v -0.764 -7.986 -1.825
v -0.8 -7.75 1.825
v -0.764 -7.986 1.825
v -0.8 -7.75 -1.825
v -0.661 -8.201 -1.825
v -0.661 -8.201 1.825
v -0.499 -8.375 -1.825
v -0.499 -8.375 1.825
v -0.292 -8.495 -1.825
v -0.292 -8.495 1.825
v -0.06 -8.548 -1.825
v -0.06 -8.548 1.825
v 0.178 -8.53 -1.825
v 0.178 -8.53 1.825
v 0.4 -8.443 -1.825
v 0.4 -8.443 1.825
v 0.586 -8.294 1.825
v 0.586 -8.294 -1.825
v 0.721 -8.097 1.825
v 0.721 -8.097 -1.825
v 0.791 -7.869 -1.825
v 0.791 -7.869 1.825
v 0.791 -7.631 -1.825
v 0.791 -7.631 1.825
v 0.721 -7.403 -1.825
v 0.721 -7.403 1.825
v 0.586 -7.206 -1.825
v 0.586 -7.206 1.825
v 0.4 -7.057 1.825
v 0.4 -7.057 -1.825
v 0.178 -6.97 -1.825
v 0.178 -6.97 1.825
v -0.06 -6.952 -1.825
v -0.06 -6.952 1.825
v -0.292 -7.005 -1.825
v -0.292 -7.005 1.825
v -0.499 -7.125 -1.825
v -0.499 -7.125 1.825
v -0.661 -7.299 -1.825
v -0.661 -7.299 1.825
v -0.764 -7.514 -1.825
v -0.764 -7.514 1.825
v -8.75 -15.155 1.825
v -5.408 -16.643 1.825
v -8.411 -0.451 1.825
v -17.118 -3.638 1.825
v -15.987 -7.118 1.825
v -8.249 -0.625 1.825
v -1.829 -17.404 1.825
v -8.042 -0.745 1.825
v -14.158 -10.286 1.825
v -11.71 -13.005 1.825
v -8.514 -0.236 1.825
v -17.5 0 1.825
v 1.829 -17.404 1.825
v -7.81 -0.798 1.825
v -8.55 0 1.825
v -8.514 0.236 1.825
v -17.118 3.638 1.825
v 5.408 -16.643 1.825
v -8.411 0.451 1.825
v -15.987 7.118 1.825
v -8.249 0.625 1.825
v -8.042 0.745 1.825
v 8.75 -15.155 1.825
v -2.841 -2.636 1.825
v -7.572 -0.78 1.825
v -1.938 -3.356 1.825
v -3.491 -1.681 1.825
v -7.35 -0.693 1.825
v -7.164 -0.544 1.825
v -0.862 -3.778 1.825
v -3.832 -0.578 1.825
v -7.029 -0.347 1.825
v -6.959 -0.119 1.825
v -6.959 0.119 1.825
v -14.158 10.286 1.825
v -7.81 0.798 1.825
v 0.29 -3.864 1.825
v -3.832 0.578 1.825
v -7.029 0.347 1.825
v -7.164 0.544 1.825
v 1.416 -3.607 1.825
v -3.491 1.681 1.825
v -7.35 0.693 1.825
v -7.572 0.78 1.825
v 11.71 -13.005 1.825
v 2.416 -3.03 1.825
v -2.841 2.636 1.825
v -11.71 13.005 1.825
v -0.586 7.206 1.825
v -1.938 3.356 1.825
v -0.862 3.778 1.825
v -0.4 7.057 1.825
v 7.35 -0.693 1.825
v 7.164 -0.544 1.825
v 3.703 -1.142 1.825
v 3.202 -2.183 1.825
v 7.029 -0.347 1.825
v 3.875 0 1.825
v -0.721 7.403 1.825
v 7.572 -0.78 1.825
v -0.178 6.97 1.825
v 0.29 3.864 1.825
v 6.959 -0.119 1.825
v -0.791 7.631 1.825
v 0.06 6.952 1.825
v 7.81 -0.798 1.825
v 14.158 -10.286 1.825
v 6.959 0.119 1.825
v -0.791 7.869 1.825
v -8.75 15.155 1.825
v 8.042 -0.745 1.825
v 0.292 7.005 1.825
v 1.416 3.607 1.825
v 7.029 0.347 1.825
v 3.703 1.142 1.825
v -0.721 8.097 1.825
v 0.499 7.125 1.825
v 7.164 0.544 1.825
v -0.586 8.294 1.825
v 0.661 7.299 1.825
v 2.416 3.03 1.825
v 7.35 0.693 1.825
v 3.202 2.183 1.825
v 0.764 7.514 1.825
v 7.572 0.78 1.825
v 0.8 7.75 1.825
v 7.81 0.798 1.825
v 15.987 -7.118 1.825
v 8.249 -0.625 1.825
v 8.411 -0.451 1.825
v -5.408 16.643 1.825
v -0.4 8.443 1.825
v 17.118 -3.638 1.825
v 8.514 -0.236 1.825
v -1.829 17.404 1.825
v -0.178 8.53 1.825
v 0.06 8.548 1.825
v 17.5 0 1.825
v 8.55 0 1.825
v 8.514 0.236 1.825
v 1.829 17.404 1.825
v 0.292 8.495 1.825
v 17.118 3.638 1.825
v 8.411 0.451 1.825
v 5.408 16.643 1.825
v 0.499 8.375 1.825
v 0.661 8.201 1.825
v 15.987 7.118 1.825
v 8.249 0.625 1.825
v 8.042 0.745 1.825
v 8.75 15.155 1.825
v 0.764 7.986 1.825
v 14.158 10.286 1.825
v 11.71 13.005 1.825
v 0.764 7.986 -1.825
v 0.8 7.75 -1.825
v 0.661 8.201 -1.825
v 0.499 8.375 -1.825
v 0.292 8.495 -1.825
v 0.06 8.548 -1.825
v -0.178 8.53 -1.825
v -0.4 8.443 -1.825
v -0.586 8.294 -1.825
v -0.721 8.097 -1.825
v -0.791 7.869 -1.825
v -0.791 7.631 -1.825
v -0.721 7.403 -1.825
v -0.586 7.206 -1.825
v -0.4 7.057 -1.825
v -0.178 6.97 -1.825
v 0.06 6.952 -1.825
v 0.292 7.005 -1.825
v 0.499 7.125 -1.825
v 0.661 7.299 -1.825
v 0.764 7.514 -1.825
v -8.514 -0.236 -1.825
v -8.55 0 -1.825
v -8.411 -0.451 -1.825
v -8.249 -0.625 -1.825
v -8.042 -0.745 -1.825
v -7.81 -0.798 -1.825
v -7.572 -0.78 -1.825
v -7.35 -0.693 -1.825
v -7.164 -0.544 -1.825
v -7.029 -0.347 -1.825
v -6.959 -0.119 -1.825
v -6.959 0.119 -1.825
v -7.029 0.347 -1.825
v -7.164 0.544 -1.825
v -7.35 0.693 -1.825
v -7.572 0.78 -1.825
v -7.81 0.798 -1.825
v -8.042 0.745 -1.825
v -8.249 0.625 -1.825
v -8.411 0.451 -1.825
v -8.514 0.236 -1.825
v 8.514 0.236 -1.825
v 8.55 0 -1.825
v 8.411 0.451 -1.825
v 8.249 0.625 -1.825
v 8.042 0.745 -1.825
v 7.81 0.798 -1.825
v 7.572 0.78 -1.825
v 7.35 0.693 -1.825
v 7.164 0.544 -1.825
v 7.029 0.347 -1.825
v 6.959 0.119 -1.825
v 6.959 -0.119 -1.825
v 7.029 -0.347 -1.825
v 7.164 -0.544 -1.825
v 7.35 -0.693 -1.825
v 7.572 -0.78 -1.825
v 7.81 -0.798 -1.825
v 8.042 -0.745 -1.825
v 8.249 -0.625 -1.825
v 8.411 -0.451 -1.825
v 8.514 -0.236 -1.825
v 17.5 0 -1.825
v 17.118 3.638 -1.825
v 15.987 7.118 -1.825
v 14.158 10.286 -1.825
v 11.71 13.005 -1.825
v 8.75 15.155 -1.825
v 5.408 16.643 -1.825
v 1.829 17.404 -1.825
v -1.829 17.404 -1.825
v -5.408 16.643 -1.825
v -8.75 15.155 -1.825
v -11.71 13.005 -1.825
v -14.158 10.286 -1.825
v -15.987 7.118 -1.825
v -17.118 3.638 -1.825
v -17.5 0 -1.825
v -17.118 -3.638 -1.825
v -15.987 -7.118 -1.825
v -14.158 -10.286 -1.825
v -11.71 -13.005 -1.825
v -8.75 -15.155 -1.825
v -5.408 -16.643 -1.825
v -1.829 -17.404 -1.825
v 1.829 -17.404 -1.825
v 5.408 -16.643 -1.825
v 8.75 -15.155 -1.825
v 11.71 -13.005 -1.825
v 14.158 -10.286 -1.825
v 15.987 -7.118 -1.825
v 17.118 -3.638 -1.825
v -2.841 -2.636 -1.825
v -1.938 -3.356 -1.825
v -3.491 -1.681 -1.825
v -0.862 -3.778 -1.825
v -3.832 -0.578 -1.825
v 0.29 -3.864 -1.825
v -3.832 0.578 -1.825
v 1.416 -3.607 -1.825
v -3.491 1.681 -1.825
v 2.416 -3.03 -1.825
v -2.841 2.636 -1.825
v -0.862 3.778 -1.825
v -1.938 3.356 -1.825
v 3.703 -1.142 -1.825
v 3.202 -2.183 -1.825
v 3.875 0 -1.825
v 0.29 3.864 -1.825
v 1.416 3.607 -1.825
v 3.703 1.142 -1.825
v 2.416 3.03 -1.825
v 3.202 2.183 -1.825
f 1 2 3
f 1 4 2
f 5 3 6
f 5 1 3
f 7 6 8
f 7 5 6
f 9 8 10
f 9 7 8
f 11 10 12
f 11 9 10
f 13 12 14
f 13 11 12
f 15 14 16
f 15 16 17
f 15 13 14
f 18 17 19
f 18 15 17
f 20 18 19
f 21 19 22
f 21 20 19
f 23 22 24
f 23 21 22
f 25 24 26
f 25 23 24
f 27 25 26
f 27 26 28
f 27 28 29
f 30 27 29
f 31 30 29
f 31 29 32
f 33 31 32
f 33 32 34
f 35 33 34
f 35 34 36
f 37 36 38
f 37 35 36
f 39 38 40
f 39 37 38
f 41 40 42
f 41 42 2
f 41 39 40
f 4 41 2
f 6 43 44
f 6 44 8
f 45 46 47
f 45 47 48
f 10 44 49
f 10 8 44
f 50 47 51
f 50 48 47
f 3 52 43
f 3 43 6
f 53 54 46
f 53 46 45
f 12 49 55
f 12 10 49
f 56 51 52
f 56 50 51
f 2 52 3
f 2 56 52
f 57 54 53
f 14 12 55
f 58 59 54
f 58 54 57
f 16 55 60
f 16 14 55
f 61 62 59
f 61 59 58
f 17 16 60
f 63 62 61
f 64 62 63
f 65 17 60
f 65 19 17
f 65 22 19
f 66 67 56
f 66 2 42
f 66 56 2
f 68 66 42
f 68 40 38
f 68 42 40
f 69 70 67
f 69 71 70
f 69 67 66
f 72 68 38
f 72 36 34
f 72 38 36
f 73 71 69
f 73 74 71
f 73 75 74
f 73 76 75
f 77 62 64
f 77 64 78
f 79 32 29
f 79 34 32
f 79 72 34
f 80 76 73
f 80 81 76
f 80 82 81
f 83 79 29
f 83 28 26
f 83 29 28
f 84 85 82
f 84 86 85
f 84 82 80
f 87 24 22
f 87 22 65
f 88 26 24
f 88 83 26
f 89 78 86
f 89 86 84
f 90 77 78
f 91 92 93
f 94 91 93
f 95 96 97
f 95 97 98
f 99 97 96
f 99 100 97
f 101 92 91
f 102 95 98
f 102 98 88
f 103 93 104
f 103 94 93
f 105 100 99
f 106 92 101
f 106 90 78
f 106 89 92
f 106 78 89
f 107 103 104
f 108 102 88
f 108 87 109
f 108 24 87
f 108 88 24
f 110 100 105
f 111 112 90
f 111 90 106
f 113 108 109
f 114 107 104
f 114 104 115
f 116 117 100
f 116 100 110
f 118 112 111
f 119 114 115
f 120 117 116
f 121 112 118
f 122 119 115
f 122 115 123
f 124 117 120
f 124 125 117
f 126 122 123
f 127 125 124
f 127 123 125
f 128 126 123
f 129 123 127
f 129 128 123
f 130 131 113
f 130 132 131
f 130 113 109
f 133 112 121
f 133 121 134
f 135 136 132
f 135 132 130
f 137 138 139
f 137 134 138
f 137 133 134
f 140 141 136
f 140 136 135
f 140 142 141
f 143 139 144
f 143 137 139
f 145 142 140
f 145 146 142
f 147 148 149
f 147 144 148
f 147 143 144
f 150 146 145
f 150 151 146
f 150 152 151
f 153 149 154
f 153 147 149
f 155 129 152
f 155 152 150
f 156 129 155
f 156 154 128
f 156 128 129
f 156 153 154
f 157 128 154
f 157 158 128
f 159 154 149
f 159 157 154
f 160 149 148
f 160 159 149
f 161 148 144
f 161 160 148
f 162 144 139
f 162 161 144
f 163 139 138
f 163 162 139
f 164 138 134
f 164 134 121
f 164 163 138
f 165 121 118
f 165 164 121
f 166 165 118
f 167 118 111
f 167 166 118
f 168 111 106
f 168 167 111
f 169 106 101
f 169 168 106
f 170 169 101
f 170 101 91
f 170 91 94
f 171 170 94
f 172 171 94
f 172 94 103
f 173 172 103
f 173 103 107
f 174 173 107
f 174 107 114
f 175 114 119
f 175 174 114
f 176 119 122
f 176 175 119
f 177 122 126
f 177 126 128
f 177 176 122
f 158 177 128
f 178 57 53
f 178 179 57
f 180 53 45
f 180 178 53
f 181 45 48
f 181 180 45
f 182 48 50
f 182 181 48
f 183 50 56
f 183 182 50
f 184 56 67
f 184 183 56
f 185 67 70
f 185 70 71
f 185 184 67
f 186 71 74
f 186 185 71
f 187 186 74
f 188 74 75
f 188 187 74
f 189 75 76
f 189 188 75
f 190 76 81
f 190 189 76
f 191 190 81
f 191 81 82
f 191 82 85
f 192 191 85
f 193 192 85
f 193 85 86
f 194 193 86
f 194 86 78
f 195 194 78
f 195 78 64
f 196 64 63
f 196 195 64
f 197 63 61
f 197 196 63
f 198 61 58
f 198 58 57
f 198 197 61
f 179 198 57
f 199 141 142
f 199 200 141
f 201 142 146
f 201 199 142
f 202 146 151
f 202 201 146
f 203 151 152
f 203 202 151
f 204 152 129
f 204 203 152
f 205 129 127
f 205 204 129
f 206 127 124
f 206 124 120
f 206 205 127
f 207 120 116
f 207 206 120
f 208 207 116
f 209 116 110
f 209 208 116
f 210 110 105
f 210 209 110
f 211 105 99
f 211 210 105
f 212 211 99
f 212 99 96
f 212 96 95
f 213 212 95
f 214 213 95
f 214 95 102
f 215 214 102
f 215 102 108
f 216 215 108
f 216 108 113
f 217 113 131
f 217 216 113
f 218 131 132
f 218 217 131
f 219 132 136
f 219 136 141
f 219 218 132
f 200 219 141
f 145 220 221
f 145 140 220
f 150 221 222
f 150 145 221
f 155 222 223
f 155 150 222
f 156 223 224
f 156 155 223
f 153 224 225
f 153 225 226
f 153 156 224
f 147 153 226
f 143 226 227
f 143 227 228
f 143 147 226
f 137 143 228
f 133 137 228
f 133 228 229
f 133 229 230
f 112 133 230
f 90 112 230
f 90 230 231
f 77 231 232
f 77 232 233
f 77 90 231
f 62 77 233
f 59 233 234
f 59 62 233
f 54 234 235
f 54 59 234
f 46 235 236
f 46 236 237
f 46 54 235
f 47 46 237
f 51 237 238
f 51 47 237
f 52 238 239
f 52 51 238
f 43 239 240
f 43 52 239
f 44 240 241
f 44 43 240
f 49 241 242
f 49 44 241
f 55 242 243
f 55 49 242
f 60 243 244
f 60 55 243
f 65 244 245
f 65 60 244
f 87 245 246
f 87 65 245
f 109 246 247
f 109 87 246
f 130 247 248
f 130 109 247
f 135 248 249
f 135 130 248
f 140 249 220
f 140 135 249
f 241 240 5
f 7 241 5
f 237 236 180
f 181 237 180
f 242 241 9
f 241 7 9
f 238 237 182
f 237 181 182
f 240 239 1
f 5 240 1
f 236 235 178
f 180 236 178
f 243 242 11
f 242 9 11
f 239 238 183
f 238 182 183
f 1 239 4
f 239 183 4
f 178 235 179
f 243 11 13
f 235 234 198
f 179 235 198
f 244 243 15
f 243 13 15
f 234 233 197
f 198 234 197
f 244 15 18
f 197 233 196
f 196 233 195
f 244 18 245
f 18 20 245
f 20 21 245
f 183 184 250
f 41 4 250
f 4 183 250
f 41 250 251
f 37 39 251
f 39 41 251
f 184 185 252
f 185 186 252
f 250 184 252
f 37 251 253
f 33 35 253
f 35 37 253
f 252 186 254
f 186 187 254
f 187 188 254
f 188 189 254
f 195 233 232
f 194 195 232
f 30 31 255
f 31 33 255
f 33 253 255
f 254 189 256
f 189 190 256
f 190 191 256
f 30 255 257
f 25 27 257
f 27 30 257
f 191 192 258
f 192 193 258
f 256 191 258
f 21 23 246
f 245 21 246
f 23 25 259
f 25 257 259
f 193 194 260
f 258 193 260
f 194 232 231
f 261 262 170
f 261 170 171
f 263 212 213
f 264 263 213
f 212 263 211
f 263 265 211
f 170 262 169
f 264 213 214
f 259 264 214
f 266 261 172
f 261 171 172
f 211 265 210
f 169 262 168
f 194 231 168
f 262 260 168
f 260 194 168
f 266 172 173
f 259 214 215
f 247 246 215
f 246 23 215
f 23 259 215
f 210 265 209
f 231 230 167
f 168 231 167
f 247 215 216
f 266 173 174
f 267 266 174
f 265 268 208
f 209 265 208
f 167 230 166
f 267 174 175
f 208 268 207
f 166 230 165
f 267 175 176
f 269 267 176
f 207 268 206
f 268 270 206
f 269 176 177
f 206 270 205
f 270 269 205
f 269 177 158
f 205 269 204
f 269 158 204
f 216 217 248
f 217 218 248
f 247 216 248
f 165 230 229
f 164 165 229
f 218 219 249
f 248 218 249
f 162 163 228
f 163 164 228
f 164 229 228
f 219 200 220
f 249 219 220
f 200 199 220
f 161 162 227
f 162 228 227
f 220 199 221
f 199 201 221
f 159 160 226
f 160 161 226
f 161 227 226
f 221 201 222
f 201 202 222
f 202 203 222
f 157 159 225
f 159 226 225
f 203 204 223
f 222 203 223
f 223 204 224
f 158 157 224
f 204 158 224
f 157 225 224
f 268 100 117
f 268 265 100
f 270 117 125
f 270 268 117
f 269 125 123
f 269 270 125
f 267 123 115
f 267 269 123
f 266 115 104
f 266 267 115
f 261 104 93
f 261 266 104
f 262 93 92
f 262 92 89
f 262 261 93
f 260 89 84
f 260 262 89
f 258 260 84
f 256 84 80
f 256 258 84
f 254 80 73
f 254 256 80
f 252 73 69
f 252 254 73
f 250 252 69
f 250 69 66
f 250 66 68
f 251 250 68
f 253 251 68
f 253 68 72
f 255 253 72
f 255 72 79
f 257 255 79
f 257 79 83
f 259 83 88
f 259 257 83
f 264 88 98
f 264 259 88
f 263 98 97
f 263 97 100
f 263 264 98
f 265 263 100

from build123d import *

# Parameters (mm, degrees)
SKETCH1_R           = 17.5
SKETCH1_R_2         = 3.875
SKETCH1_R_3         = 0.8
BOSS_EXTRUDE1_DEPTH = 1.825


with BuildPart() as part:
    # Sketch1 → Boss-Extrude1 (new, symmetric)
    with BuildSketch(Plane.XY):
        Circle(SKETCH1_R)
        Circle(SKETCH1_R_2, mode=Mode.SUBTRACT)
        with Locations((7.75, 0)):
            Circle(SKETCH1_R_3, mode=Mode.SUBTRACT)
        with Locations((0, 7.75)):
            Circle(SKETCH1_R_3, mode=Mode.SUBTRACT)
        with Locations(Location((-7.75, 0, 0), (0, 0, 180))):
            Circle(SKETCH1_R_3, mode=Mode.SUBTRACT)
        with Locations(Location((0, -7.75, 0), (0, 0, 180))):
            Circle(SKETCH1_R_3, mode=Mode.SUBTRACT)
    extrude(amount=BOSS_EXTRUDE1_DEPTH, both=True)


solid = part.part
